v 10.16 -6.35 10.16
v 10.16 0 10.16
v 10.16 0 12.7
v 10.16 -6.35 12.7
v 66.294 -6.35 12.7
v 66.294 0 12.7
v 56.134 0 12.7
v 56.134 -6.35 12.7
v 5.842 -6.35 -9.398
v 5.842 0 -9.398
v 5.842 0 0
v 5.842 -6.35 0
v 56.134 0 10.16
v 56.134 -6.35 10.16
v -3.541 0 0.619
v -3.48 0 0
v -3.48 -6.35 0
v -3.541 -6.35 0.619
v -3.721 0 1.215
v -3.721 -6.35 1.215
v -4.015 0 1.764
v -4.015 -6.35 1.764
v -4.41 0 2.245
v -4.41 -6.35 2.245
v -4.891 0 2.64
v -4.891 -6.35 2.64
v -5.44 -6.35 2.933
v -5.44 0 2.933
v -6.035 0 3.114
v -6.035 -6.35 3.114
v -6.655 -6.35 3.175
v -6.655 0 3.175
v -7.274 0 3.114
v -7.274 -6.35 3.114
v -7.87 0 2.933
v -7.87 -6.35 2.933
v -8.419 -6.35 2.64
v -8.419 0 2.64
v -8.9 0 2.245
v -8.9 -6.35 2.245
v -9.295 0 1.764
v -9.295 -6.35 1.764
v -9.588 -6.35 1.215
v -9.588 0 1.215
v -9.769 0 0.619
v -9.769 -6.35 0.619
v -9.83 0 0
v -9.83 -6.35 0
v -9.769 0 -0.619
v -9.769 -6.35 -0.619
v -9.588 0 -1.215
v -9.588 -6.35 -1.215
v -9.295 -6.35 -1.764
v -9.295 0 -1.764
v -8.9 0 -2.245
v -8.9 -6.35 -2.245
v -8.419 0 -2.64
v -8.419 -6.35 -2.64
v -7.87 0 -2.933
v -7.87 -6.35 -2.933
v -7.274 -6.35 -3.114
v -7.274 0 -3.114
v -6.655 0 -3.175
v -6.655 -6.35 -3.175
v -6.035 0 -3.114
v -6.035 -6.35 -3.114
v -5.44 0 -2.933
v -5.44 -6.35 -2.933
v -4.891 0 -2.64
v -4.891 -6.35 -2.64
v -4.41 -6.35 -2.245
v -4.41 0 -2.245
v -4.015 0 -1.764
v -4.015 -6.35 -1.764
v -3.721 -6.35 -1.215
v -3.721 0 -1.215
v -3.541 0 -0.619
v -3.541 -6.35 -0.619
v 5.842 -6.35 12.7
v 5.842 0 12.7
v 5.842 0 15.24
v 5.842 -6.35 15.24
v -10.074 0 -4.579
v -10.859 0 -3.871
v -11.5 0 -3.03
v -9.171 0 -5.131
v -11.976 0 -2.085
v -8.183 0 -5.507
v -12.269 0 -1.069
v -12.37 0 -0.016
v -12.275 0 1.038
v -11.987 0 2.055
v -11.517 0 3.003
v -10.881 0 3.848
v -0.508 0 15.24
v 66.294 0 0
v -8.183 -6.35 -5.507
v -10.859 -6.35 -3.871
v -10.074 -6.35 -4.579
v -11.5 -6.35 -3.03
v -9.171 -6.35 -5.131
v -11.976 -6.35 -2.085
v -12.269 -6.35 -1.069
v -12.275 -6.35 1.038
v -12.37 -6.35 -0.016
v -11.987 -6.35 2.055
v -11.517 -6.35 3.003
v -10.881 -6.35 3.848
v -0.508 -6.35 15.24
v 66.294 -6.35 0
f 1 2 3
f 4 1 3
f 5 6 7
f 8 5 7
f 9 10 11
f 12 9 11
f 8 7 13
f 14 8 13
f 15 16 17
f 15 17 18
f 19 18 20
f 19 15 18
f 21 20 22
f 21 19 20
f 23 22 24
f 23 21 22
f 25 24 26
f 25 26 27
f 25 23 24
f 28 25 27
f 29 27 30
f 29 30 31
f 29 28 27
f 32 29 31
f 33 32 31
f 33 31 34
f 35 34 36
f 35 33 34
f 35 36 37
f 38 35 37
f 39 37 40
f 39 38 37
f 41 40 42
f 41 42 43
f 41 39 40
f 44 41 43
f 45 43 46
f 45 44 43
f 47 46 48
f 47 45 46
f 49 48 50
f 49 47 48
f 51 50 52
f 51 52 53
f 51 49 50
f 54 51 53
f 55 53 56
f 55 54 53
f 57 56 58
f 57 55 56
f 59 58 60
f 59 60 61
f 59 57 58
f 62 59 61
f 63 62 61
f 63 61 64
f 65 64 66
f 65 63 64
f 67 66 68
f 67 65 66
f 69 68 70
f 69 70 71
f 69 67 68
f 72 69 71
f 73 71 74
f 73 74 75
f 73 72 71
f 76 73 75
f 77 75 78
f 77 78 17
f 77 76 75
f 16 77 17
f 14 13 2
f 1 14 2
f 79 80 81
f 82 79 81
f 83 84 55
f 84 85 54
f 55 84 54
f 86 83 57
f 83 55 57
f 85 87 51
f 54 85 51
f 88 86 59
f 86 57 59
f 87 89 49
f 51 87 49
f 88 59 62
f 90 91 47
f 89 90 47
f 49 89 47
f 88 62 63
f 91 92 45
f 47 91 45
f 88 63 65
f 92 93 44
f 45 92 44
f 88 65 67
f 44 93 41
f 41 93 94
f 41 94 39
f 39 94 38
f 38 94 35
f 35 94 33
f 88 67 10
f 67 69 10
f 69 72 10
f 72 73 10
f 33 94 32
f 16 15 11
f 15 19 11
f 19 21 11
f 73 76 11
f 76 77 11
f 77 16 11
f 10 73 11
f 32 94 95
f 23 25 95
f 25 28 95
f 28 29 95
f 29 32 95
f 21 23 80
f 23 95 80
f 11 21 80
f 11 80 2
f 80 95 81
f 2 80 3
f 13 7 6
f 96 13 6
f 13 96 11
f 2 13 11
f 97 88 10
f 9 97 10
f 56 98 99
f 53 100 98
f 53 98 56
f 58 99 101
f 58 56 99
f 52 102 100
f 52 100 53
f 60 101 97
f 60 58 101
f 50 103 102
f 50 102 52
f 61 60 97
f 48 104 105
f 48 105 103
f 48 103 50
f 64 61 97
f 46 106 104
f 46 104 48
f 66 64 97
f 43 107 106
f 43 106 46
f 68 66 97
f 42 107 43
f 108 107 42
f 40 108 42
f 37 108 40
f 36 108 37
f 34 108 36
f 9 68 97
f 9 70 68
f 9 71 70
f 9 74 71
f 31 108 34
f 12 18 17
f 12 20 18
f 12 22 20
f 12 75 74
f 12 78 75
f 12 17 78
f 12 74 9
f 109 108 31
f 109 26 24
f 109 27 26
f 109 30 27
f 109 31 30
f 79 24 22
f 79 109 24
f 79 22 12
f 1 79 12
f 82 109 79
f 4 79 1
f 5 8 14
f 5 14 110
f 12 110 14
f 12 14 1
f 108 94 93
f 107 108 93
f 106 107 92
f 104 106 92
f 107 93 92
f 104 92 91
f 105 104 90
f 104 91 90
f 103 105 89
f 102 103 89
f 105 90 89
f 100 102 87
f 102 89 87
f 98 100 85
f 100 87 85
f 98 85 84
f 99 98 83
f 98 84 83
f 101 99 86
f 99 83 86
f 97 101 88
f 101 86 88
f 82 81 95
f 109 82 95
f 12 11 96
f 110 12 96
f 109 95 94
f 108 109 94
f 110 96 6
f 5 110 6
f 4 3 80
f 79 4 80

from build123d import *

# Parameters (mm, degrees)
F0_R     = 3.175
F0_W     = 5.842
F0_H     = 12.7
F1_DEPTH = 6.35


with BuildPart() as f1:
    # F0 (on Front) → F1 (new body)
    with BuildSketch(Plane.XZ):
        with BuildLine():
            Line((5.842, 0), (0, 0))
            Line((0, 0), (-0.9398, 0))
            ThreePointArc((-0.9398, 0), (-3.195791, -4.549339), (-8.182663, -5.506983))
            Line((-8.182663, -5.506983), (5.842, -9.398))
            Line((5.842, -9.398), (5.842, 0))
        make_face()
        with BuildLine():
            ThreePointArc((-8.182663, -5.506983), (-3.195791, -4.549339), (-0.9398, 0))
            ThreePointArc((-0.9398, 0), (-4.591961, 5.329721), (-10.88063, 3.847543))
            ThreePointArc((-10.88063, 3.847543), (-12.145978, -1.583727), (-8.182663, -5.506983))
        make_face()
        with Locations((-6.6548, 0)):
            Circle(F0_R, mode=Mode.SUBTRACT)
        with BuildLine():
            Line((-0.9398, 0), (0, 0))
            Line((0, 0), (0, 12.7))
            Line((0, 12.7), (5.842, 12.7))
            Line((5.842, 12.7), (5.842, 15.24))
            Line((5.842, 15.24), (-0.508, 15.24))
            Line((-0.508, 15.24), (-10.88063, 3.847543))
            ThreePointArc((-10.88063, 3.847543), (-4.591961, 5.329721), (-0.9398, 0))
        make_face()
        with Locations((2.921, 6.35)):
            Rectangle(F0_W, F0_H)
        Polygon((5.842, 12.7), (5.842, 0), (66.294, 0), (66.294, 12.7), (56.134, 12.7), (56.134, 10.16), (10.16, 10.16), (10.16, 12.7), align=None)
    extrude(amount=F1_DEPTH)


solid = f1.part
